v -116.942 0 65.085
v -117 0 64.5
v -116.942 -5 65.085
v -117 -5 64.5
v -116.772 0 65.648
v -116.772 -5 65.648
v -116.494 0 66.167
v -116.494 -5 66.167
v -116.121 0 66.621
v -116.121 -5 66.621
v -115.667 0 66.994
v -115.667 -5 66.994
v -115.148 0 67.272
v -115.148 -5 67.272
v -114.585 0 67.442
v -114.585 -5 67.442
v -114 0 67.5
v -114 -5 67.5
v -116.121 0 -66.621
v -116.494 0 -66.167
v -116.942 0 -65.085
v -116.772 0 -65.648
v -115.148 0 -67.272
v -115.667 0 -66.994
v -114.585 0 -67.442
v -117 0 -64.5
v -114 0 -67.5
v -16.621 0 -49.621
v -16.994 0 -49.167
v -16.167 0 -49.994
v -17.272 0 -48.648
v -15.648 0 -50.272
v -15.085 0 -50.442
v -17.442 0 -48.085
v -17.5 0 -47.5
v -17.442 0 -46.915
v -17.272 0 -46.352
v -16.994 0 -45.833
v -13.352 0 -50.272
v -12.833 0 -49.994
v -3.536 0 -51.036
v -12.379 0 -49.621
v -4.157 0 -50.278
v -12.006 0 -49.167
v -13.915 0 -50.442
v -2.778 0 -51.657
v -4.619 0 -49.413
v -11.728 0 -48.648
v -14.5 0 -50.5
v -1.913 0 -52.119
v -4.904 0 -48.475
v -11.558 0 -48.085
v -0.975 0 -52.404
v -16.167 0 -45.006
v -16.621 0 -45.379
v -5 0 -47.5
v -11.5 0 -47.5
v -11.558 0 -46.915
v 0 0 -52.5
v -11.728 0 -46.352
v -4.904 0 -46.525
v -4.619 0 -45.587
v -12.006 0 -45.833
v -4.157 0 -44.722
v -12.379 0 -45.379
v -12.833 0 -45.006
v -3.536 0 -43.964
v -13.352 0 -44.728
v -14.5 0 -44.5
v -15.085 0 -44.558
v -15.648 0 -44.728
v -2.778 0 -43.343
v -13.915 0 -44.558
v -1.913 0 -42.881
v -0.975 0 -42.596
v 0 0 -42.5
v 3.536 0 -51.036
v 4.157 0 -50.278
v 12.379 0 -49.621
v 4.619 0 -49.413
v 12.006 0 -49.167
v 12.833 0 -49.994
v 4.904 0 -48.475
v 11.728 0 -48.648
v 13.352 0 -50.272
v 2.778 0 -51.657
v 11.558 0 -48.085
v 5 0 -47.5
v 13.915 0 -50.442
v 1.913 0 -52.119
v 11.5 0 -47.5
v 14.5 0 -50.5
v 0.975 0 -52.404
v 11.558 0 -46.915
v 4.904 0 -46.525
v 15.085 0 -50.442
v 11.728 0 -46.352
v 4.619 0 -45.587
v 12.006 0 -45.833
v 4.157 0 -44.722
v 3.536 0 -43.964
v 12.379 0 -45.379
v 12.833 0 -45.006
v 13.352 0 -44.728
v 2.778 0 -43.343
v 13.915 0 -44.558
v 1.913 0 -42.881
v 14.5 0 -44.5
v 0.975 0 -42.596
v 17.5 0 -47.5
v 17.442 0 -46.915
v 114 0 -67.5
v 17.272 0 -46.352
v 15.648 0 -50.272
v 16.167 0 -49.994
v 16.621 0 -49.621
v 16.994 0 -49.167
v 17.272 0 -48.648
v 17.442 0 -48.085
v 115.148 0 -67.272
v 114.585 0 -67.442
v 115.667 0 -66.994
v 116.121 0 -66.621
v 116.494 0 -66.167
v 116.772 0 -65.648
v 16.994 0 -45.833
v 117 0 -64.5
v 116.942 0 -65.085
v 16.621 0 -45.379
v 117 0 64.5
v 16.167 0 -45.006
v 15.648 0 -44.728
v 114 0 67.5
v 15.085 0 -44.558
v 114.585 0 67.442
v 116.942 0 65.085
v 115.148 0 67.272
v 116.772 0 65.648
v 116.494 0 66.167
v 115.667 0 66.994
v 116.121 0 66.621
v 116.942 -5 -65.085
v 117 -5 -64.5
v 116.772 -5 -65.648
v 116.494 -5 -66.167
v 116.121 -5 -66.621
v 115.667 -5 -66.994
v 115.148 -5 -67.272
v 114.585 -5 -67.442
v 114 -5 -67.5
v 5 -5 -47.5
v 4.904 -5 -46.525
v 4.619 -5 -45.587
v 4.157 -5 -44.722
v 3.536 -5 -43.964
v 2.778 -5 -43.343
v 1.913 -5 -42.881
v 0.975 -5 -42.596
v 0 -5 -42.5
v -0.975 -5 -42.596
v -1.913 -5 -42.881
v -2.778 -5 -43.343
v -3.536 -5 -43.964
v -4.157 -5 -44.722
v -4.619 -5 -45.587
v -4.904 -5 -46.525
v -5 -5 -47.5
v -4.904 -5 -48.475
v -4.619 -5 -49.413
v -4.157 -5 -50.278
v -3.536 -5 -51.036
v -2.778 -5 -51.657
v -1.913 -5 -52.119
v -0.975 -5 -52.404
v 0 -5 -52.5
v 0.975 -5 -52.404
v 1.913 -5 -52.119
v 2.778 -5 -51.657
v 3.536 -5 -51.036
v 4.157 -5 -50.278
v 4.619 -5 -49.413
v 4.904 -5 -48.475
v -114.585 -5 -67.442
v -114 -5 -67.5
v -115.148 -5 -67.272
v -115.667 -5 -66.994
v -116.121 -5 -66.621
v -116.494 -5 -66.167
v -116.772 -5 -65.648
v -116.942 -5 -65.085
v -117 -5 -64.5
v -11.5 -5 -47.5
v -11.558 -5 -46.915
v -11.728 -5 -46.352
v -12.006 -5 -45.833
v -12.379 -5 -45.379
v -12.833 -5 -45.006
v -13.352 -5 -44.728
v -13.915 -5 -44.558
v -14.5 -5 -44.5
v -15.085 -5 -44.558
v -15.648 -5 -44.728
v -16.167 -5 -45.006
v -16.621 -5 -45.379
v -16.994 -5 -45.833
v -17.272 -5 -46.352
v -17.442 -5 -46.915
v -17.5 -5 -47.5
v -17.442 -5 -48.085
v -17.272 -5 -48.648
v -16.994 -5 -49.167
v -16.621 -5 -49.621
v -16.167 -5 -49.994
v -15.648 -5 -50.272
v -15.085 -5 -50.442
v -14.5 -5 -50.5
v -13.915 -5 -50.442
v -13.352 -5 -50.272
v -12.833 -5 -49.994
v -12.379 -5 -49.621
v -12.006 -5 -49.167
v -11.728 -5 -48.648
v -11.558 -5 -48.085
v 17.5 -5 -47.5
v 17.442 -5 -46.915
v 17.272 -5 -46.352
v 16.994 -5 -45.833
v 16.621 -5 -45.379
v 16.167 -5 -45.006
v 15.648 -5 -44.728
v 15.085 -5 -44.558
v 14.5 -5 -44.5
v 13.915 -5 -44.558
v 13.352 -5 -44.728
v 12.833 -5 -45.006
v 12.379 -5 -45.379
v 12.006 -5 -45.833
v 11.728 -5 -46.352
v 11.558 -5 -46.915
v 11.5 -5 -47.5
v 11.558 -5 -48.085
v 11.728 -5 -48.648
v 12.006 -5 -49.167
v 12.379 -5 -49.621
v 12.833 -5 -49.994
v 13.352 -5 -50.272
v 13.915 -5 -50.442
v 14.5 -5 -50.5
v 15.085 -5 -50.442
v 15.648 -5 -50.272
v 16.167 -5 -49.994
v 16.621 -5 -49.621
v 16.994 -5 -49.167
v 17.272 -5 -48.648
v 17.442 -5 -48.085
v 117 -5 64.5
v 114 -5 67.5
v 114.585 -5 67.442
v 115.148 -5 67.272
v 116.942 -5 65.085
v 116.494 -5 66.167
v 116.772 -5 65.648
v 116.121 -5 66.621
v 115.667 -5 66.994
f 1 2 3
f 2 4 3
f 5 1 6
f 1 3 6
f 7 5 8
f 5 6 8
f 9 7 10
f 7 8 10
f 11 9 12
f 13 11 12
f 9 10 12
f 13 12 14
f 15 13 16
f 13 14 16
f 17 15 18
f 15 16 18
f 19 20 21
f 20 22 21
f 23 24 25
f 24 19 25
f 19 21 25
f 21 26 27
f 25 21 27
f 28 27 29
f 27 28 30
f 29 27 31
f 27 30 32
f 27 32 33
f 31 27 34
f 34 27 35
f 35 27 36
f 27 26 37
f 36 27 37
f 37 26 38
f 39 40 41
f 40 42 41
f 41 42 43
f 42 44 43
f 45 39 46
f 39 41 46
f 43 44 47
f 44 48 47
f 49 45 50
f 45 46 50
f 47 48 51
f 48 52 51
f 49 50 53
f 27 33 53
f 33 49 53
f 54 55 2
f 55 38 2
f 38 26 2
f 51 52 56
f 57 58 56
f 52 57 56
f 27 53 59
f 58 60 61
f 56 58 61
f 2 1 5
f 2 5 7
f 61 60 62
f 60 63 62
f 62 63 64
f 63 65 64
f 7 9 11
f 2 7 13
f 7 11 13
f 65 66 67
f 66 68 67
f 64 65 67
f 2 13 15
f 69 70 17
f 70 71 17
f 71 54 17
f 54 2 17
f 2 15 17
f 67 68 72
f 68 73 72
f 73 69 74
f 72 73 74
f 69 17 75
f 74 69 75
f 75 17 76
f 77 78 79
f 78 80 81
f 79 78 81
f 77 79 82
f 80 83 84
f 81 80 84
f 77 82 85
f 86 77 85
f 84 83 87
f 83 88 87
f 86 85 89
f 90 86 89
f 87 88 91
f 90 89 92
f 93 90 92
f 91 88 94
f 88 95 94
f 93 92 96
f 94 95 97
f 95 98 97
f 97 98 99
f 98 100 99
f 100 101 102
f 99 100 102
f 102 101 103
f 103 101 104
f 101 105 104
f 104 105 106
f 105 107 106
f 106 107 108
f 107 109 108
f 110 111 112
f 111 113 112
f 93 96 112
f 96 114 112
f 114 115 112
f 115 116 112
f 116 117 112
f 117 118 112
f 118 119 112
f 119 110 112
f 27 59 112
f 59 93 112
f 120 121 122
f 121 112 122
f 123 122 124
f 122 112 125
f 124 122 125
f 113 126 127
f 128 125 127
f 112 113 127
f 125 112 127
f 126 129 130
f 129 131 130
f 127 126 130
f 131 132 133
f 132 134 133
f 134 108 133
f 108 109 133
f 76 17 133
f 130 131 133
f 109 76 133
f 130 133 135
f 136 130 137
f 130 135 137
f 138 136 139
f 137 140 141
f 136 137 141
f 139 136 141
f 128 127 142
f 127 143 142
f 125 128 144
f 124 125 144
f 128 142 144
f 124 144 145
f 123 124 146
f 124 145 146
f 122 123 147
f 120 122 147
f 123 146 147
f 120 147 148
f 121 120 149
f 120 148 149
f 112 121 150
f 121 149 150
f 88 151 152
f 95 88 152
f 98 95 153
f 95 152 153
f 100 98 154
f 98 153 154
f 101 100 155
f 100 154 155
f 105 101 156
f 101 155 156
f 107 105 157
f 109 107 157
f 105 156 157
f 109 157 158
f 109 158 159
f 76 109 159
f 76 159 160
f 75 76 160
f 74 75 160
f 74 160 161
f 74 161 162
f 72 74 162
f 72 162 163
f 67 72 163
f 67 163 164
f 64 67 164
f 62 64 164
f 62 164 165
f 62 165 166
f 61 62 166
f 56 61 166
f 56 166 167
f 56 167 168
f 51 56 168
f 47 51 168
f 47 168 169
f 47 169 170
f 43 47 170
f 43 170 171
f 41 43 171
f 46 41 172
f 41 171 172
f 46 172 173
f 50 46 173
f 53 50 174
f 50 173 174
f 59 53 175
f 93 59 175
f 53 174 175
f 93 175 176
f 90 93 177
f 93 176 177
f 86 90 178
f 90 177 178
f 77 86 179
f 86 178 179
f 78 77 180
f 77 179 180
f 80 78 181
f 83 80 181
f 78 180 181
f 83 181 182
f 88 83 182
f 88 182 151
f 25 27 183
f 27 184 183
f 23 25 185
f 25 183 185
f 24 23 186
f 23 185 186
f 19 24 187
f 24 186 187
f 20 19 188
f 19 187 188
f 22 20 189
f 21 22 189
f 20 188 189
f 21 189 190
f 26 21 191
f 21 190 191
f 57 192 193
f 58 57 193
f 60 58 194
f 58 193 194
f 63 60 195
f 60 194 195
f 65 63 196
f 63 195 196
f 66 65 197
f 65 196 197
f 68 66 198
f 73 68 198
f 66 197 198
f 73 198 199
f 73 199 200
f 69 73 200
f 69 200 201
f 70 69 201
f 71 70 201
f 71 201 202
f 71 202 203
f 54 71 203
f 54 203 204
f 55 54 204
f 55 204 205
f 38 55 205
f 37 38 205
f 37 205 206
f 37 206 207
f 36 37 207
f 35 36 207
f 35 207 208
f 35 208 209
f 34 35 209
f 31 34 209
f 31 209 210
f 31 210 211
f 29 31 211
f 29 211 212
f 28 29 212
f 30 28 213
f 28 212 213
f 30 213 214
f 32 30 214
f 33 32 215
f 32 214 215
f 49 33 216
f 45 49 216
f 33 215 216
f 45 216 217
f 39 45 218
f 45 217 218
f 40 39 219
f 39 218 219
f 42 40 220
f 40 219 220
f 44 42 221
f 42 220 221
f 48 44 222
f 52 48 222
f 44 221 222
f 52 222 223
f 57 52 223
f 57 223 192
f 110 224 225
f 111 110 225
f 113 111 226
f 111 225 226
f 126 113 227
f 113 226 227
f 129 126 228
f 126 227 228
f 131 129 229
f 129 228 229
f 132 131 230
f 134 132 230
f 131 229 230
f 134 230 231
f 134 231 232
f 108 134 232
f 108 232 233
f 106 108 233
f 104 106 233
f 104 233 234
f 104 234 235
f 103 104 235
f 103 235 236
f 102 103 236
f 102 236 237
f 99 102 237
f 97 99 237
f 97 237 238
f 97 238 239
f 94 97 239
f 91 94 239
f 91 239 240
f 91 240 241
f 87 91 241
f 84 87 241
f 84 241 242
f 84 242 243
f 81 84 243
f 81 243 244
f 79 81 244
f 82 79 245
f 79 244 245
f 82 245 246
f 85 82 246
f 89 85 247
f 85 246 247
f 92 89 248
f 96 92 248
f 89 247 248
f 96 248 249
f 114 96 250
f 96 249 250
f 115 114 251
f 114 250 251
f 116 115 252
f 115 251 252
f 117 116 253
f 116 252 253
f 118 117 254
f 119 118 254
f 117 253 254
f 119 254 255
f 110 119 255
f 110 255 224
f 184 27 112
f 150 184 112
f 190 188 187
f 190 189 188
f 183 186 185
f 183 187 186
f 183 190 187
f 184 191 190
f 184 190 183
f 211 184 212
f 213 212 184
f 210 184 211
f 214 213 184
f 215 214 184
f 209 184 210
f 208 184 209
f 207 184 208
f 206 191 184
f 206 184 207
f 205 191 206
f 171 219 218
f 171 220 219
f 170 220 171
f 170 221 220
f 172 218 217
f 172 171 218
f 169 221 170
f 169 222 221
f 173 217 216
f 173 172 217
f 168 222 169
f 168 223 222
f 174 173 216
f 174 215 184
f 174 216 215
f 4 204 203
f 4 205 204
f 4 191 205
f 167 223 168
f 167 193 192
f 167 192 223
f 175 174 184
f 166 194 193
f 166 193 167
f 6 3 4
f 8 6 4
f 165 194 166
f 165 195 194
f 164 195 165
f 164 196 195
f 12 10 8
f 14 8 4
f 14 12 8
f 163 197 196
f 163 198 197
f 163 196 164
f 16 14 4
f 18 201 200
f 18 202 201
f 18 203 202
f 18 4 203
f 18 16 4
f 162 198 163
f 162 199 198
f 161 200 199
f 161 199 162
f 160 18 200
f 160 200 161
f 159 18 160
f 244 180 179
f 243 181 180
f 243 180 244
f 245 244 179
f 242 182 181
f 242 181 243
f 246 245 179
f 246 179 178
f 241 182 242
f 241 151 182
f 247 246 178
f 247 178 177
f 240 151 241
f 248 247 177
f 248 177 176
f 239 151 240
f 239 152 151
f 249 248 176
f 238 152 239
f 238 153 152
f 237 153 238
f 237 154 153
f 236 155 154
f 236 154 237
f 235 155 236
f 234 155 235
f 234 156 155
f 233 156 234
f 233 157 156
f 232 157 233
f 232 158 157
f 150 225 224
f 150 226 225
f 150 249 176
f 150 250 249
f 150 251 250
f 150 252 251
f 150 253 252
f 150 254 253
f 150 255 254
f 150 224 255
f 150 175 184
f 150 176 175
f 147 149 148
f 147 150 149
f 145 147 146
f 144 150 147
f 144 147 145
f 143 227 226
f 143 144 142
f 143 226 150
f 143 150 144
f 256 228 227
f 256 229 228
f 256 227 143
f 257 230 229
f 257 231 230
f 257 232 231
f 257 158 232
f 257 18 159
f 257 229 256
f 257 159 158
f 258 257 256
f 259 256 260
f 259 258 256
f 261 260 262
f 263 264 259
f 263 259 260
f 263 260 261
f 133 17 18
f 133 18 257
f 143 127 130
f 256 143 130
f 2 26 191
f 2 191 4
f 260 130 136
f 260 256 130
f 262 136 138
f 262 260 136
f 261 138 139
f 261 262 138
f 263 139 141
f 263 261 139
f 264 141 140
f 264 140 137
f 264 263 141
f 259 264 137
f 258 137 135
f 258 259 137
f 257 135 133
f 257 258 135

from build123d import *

# Parameters (mm, degrees)
SKETCH_W      = 234
SKETCH_H      = 135
PAD_DEPTH     = 5
FILLET_R      = 3
FILLET001_R   = 3
FILLET002_R   = 3
FILLET003_R   = 3
SKETCH001_R   = 3
SKETCH001_R_2 = 5
POCKET_DEPTH  = 5.001


with BuildPart() as part:
    # Sketch → Pad (new body)
    with BuildSketch(Plane.XZ):
        Rectangle(SKETCH_W, SKETCH_H)
    extrude(amount=PAD_DEPTH)

    # Fillet
    fillet_edges = [part.edges().sort_by_distance(p)[0] for p in [
        (117, -2.5, 67.5),
    ]]
    fillet(fillet_edges, radius=FILLET_R)

    # Fillet001
    fillet001_edges = [part.edges().sort_by_distance(p)[0] for p in [
        (117, -2.5, -67.5),
    ]]
    fillet(fillet001_edges, radius=FILLET001_R)

    # Fillet002
    fillet002_edges = [part.edges().sort_by_distance(p)[0] for p in [
        (-117, -2.5, -67.5),
    ]]
    fillet(fillet002_edges, radius=FILLET002_R)

    # Fillet003
    fillet003_edges = [part.edges().sort_by_distance(p)[0] for p in [
        (-117, -2.5, 67.5),
    ]]
    fillet(fillet003_edges, radius=FILLET003_R)

    # Sketch001 (on Face10 of Fillet003) → Pocket (cut, through all)
    with BuildSketch(Plane.XZ.offset(5)):
        with Locations((-14.5, -47.5)):
            Circle(SKETCH001_R)
        with Locations((0, -47.5)):
            Circle(SKETCH001_R_2)
        with Locations((14.5, -47.5)):
            Circle(SKETCH001_R)
    extrude(amount=-POCKET_DEPTH, mode=Mode.SUBTRACT)


solid = part.part
